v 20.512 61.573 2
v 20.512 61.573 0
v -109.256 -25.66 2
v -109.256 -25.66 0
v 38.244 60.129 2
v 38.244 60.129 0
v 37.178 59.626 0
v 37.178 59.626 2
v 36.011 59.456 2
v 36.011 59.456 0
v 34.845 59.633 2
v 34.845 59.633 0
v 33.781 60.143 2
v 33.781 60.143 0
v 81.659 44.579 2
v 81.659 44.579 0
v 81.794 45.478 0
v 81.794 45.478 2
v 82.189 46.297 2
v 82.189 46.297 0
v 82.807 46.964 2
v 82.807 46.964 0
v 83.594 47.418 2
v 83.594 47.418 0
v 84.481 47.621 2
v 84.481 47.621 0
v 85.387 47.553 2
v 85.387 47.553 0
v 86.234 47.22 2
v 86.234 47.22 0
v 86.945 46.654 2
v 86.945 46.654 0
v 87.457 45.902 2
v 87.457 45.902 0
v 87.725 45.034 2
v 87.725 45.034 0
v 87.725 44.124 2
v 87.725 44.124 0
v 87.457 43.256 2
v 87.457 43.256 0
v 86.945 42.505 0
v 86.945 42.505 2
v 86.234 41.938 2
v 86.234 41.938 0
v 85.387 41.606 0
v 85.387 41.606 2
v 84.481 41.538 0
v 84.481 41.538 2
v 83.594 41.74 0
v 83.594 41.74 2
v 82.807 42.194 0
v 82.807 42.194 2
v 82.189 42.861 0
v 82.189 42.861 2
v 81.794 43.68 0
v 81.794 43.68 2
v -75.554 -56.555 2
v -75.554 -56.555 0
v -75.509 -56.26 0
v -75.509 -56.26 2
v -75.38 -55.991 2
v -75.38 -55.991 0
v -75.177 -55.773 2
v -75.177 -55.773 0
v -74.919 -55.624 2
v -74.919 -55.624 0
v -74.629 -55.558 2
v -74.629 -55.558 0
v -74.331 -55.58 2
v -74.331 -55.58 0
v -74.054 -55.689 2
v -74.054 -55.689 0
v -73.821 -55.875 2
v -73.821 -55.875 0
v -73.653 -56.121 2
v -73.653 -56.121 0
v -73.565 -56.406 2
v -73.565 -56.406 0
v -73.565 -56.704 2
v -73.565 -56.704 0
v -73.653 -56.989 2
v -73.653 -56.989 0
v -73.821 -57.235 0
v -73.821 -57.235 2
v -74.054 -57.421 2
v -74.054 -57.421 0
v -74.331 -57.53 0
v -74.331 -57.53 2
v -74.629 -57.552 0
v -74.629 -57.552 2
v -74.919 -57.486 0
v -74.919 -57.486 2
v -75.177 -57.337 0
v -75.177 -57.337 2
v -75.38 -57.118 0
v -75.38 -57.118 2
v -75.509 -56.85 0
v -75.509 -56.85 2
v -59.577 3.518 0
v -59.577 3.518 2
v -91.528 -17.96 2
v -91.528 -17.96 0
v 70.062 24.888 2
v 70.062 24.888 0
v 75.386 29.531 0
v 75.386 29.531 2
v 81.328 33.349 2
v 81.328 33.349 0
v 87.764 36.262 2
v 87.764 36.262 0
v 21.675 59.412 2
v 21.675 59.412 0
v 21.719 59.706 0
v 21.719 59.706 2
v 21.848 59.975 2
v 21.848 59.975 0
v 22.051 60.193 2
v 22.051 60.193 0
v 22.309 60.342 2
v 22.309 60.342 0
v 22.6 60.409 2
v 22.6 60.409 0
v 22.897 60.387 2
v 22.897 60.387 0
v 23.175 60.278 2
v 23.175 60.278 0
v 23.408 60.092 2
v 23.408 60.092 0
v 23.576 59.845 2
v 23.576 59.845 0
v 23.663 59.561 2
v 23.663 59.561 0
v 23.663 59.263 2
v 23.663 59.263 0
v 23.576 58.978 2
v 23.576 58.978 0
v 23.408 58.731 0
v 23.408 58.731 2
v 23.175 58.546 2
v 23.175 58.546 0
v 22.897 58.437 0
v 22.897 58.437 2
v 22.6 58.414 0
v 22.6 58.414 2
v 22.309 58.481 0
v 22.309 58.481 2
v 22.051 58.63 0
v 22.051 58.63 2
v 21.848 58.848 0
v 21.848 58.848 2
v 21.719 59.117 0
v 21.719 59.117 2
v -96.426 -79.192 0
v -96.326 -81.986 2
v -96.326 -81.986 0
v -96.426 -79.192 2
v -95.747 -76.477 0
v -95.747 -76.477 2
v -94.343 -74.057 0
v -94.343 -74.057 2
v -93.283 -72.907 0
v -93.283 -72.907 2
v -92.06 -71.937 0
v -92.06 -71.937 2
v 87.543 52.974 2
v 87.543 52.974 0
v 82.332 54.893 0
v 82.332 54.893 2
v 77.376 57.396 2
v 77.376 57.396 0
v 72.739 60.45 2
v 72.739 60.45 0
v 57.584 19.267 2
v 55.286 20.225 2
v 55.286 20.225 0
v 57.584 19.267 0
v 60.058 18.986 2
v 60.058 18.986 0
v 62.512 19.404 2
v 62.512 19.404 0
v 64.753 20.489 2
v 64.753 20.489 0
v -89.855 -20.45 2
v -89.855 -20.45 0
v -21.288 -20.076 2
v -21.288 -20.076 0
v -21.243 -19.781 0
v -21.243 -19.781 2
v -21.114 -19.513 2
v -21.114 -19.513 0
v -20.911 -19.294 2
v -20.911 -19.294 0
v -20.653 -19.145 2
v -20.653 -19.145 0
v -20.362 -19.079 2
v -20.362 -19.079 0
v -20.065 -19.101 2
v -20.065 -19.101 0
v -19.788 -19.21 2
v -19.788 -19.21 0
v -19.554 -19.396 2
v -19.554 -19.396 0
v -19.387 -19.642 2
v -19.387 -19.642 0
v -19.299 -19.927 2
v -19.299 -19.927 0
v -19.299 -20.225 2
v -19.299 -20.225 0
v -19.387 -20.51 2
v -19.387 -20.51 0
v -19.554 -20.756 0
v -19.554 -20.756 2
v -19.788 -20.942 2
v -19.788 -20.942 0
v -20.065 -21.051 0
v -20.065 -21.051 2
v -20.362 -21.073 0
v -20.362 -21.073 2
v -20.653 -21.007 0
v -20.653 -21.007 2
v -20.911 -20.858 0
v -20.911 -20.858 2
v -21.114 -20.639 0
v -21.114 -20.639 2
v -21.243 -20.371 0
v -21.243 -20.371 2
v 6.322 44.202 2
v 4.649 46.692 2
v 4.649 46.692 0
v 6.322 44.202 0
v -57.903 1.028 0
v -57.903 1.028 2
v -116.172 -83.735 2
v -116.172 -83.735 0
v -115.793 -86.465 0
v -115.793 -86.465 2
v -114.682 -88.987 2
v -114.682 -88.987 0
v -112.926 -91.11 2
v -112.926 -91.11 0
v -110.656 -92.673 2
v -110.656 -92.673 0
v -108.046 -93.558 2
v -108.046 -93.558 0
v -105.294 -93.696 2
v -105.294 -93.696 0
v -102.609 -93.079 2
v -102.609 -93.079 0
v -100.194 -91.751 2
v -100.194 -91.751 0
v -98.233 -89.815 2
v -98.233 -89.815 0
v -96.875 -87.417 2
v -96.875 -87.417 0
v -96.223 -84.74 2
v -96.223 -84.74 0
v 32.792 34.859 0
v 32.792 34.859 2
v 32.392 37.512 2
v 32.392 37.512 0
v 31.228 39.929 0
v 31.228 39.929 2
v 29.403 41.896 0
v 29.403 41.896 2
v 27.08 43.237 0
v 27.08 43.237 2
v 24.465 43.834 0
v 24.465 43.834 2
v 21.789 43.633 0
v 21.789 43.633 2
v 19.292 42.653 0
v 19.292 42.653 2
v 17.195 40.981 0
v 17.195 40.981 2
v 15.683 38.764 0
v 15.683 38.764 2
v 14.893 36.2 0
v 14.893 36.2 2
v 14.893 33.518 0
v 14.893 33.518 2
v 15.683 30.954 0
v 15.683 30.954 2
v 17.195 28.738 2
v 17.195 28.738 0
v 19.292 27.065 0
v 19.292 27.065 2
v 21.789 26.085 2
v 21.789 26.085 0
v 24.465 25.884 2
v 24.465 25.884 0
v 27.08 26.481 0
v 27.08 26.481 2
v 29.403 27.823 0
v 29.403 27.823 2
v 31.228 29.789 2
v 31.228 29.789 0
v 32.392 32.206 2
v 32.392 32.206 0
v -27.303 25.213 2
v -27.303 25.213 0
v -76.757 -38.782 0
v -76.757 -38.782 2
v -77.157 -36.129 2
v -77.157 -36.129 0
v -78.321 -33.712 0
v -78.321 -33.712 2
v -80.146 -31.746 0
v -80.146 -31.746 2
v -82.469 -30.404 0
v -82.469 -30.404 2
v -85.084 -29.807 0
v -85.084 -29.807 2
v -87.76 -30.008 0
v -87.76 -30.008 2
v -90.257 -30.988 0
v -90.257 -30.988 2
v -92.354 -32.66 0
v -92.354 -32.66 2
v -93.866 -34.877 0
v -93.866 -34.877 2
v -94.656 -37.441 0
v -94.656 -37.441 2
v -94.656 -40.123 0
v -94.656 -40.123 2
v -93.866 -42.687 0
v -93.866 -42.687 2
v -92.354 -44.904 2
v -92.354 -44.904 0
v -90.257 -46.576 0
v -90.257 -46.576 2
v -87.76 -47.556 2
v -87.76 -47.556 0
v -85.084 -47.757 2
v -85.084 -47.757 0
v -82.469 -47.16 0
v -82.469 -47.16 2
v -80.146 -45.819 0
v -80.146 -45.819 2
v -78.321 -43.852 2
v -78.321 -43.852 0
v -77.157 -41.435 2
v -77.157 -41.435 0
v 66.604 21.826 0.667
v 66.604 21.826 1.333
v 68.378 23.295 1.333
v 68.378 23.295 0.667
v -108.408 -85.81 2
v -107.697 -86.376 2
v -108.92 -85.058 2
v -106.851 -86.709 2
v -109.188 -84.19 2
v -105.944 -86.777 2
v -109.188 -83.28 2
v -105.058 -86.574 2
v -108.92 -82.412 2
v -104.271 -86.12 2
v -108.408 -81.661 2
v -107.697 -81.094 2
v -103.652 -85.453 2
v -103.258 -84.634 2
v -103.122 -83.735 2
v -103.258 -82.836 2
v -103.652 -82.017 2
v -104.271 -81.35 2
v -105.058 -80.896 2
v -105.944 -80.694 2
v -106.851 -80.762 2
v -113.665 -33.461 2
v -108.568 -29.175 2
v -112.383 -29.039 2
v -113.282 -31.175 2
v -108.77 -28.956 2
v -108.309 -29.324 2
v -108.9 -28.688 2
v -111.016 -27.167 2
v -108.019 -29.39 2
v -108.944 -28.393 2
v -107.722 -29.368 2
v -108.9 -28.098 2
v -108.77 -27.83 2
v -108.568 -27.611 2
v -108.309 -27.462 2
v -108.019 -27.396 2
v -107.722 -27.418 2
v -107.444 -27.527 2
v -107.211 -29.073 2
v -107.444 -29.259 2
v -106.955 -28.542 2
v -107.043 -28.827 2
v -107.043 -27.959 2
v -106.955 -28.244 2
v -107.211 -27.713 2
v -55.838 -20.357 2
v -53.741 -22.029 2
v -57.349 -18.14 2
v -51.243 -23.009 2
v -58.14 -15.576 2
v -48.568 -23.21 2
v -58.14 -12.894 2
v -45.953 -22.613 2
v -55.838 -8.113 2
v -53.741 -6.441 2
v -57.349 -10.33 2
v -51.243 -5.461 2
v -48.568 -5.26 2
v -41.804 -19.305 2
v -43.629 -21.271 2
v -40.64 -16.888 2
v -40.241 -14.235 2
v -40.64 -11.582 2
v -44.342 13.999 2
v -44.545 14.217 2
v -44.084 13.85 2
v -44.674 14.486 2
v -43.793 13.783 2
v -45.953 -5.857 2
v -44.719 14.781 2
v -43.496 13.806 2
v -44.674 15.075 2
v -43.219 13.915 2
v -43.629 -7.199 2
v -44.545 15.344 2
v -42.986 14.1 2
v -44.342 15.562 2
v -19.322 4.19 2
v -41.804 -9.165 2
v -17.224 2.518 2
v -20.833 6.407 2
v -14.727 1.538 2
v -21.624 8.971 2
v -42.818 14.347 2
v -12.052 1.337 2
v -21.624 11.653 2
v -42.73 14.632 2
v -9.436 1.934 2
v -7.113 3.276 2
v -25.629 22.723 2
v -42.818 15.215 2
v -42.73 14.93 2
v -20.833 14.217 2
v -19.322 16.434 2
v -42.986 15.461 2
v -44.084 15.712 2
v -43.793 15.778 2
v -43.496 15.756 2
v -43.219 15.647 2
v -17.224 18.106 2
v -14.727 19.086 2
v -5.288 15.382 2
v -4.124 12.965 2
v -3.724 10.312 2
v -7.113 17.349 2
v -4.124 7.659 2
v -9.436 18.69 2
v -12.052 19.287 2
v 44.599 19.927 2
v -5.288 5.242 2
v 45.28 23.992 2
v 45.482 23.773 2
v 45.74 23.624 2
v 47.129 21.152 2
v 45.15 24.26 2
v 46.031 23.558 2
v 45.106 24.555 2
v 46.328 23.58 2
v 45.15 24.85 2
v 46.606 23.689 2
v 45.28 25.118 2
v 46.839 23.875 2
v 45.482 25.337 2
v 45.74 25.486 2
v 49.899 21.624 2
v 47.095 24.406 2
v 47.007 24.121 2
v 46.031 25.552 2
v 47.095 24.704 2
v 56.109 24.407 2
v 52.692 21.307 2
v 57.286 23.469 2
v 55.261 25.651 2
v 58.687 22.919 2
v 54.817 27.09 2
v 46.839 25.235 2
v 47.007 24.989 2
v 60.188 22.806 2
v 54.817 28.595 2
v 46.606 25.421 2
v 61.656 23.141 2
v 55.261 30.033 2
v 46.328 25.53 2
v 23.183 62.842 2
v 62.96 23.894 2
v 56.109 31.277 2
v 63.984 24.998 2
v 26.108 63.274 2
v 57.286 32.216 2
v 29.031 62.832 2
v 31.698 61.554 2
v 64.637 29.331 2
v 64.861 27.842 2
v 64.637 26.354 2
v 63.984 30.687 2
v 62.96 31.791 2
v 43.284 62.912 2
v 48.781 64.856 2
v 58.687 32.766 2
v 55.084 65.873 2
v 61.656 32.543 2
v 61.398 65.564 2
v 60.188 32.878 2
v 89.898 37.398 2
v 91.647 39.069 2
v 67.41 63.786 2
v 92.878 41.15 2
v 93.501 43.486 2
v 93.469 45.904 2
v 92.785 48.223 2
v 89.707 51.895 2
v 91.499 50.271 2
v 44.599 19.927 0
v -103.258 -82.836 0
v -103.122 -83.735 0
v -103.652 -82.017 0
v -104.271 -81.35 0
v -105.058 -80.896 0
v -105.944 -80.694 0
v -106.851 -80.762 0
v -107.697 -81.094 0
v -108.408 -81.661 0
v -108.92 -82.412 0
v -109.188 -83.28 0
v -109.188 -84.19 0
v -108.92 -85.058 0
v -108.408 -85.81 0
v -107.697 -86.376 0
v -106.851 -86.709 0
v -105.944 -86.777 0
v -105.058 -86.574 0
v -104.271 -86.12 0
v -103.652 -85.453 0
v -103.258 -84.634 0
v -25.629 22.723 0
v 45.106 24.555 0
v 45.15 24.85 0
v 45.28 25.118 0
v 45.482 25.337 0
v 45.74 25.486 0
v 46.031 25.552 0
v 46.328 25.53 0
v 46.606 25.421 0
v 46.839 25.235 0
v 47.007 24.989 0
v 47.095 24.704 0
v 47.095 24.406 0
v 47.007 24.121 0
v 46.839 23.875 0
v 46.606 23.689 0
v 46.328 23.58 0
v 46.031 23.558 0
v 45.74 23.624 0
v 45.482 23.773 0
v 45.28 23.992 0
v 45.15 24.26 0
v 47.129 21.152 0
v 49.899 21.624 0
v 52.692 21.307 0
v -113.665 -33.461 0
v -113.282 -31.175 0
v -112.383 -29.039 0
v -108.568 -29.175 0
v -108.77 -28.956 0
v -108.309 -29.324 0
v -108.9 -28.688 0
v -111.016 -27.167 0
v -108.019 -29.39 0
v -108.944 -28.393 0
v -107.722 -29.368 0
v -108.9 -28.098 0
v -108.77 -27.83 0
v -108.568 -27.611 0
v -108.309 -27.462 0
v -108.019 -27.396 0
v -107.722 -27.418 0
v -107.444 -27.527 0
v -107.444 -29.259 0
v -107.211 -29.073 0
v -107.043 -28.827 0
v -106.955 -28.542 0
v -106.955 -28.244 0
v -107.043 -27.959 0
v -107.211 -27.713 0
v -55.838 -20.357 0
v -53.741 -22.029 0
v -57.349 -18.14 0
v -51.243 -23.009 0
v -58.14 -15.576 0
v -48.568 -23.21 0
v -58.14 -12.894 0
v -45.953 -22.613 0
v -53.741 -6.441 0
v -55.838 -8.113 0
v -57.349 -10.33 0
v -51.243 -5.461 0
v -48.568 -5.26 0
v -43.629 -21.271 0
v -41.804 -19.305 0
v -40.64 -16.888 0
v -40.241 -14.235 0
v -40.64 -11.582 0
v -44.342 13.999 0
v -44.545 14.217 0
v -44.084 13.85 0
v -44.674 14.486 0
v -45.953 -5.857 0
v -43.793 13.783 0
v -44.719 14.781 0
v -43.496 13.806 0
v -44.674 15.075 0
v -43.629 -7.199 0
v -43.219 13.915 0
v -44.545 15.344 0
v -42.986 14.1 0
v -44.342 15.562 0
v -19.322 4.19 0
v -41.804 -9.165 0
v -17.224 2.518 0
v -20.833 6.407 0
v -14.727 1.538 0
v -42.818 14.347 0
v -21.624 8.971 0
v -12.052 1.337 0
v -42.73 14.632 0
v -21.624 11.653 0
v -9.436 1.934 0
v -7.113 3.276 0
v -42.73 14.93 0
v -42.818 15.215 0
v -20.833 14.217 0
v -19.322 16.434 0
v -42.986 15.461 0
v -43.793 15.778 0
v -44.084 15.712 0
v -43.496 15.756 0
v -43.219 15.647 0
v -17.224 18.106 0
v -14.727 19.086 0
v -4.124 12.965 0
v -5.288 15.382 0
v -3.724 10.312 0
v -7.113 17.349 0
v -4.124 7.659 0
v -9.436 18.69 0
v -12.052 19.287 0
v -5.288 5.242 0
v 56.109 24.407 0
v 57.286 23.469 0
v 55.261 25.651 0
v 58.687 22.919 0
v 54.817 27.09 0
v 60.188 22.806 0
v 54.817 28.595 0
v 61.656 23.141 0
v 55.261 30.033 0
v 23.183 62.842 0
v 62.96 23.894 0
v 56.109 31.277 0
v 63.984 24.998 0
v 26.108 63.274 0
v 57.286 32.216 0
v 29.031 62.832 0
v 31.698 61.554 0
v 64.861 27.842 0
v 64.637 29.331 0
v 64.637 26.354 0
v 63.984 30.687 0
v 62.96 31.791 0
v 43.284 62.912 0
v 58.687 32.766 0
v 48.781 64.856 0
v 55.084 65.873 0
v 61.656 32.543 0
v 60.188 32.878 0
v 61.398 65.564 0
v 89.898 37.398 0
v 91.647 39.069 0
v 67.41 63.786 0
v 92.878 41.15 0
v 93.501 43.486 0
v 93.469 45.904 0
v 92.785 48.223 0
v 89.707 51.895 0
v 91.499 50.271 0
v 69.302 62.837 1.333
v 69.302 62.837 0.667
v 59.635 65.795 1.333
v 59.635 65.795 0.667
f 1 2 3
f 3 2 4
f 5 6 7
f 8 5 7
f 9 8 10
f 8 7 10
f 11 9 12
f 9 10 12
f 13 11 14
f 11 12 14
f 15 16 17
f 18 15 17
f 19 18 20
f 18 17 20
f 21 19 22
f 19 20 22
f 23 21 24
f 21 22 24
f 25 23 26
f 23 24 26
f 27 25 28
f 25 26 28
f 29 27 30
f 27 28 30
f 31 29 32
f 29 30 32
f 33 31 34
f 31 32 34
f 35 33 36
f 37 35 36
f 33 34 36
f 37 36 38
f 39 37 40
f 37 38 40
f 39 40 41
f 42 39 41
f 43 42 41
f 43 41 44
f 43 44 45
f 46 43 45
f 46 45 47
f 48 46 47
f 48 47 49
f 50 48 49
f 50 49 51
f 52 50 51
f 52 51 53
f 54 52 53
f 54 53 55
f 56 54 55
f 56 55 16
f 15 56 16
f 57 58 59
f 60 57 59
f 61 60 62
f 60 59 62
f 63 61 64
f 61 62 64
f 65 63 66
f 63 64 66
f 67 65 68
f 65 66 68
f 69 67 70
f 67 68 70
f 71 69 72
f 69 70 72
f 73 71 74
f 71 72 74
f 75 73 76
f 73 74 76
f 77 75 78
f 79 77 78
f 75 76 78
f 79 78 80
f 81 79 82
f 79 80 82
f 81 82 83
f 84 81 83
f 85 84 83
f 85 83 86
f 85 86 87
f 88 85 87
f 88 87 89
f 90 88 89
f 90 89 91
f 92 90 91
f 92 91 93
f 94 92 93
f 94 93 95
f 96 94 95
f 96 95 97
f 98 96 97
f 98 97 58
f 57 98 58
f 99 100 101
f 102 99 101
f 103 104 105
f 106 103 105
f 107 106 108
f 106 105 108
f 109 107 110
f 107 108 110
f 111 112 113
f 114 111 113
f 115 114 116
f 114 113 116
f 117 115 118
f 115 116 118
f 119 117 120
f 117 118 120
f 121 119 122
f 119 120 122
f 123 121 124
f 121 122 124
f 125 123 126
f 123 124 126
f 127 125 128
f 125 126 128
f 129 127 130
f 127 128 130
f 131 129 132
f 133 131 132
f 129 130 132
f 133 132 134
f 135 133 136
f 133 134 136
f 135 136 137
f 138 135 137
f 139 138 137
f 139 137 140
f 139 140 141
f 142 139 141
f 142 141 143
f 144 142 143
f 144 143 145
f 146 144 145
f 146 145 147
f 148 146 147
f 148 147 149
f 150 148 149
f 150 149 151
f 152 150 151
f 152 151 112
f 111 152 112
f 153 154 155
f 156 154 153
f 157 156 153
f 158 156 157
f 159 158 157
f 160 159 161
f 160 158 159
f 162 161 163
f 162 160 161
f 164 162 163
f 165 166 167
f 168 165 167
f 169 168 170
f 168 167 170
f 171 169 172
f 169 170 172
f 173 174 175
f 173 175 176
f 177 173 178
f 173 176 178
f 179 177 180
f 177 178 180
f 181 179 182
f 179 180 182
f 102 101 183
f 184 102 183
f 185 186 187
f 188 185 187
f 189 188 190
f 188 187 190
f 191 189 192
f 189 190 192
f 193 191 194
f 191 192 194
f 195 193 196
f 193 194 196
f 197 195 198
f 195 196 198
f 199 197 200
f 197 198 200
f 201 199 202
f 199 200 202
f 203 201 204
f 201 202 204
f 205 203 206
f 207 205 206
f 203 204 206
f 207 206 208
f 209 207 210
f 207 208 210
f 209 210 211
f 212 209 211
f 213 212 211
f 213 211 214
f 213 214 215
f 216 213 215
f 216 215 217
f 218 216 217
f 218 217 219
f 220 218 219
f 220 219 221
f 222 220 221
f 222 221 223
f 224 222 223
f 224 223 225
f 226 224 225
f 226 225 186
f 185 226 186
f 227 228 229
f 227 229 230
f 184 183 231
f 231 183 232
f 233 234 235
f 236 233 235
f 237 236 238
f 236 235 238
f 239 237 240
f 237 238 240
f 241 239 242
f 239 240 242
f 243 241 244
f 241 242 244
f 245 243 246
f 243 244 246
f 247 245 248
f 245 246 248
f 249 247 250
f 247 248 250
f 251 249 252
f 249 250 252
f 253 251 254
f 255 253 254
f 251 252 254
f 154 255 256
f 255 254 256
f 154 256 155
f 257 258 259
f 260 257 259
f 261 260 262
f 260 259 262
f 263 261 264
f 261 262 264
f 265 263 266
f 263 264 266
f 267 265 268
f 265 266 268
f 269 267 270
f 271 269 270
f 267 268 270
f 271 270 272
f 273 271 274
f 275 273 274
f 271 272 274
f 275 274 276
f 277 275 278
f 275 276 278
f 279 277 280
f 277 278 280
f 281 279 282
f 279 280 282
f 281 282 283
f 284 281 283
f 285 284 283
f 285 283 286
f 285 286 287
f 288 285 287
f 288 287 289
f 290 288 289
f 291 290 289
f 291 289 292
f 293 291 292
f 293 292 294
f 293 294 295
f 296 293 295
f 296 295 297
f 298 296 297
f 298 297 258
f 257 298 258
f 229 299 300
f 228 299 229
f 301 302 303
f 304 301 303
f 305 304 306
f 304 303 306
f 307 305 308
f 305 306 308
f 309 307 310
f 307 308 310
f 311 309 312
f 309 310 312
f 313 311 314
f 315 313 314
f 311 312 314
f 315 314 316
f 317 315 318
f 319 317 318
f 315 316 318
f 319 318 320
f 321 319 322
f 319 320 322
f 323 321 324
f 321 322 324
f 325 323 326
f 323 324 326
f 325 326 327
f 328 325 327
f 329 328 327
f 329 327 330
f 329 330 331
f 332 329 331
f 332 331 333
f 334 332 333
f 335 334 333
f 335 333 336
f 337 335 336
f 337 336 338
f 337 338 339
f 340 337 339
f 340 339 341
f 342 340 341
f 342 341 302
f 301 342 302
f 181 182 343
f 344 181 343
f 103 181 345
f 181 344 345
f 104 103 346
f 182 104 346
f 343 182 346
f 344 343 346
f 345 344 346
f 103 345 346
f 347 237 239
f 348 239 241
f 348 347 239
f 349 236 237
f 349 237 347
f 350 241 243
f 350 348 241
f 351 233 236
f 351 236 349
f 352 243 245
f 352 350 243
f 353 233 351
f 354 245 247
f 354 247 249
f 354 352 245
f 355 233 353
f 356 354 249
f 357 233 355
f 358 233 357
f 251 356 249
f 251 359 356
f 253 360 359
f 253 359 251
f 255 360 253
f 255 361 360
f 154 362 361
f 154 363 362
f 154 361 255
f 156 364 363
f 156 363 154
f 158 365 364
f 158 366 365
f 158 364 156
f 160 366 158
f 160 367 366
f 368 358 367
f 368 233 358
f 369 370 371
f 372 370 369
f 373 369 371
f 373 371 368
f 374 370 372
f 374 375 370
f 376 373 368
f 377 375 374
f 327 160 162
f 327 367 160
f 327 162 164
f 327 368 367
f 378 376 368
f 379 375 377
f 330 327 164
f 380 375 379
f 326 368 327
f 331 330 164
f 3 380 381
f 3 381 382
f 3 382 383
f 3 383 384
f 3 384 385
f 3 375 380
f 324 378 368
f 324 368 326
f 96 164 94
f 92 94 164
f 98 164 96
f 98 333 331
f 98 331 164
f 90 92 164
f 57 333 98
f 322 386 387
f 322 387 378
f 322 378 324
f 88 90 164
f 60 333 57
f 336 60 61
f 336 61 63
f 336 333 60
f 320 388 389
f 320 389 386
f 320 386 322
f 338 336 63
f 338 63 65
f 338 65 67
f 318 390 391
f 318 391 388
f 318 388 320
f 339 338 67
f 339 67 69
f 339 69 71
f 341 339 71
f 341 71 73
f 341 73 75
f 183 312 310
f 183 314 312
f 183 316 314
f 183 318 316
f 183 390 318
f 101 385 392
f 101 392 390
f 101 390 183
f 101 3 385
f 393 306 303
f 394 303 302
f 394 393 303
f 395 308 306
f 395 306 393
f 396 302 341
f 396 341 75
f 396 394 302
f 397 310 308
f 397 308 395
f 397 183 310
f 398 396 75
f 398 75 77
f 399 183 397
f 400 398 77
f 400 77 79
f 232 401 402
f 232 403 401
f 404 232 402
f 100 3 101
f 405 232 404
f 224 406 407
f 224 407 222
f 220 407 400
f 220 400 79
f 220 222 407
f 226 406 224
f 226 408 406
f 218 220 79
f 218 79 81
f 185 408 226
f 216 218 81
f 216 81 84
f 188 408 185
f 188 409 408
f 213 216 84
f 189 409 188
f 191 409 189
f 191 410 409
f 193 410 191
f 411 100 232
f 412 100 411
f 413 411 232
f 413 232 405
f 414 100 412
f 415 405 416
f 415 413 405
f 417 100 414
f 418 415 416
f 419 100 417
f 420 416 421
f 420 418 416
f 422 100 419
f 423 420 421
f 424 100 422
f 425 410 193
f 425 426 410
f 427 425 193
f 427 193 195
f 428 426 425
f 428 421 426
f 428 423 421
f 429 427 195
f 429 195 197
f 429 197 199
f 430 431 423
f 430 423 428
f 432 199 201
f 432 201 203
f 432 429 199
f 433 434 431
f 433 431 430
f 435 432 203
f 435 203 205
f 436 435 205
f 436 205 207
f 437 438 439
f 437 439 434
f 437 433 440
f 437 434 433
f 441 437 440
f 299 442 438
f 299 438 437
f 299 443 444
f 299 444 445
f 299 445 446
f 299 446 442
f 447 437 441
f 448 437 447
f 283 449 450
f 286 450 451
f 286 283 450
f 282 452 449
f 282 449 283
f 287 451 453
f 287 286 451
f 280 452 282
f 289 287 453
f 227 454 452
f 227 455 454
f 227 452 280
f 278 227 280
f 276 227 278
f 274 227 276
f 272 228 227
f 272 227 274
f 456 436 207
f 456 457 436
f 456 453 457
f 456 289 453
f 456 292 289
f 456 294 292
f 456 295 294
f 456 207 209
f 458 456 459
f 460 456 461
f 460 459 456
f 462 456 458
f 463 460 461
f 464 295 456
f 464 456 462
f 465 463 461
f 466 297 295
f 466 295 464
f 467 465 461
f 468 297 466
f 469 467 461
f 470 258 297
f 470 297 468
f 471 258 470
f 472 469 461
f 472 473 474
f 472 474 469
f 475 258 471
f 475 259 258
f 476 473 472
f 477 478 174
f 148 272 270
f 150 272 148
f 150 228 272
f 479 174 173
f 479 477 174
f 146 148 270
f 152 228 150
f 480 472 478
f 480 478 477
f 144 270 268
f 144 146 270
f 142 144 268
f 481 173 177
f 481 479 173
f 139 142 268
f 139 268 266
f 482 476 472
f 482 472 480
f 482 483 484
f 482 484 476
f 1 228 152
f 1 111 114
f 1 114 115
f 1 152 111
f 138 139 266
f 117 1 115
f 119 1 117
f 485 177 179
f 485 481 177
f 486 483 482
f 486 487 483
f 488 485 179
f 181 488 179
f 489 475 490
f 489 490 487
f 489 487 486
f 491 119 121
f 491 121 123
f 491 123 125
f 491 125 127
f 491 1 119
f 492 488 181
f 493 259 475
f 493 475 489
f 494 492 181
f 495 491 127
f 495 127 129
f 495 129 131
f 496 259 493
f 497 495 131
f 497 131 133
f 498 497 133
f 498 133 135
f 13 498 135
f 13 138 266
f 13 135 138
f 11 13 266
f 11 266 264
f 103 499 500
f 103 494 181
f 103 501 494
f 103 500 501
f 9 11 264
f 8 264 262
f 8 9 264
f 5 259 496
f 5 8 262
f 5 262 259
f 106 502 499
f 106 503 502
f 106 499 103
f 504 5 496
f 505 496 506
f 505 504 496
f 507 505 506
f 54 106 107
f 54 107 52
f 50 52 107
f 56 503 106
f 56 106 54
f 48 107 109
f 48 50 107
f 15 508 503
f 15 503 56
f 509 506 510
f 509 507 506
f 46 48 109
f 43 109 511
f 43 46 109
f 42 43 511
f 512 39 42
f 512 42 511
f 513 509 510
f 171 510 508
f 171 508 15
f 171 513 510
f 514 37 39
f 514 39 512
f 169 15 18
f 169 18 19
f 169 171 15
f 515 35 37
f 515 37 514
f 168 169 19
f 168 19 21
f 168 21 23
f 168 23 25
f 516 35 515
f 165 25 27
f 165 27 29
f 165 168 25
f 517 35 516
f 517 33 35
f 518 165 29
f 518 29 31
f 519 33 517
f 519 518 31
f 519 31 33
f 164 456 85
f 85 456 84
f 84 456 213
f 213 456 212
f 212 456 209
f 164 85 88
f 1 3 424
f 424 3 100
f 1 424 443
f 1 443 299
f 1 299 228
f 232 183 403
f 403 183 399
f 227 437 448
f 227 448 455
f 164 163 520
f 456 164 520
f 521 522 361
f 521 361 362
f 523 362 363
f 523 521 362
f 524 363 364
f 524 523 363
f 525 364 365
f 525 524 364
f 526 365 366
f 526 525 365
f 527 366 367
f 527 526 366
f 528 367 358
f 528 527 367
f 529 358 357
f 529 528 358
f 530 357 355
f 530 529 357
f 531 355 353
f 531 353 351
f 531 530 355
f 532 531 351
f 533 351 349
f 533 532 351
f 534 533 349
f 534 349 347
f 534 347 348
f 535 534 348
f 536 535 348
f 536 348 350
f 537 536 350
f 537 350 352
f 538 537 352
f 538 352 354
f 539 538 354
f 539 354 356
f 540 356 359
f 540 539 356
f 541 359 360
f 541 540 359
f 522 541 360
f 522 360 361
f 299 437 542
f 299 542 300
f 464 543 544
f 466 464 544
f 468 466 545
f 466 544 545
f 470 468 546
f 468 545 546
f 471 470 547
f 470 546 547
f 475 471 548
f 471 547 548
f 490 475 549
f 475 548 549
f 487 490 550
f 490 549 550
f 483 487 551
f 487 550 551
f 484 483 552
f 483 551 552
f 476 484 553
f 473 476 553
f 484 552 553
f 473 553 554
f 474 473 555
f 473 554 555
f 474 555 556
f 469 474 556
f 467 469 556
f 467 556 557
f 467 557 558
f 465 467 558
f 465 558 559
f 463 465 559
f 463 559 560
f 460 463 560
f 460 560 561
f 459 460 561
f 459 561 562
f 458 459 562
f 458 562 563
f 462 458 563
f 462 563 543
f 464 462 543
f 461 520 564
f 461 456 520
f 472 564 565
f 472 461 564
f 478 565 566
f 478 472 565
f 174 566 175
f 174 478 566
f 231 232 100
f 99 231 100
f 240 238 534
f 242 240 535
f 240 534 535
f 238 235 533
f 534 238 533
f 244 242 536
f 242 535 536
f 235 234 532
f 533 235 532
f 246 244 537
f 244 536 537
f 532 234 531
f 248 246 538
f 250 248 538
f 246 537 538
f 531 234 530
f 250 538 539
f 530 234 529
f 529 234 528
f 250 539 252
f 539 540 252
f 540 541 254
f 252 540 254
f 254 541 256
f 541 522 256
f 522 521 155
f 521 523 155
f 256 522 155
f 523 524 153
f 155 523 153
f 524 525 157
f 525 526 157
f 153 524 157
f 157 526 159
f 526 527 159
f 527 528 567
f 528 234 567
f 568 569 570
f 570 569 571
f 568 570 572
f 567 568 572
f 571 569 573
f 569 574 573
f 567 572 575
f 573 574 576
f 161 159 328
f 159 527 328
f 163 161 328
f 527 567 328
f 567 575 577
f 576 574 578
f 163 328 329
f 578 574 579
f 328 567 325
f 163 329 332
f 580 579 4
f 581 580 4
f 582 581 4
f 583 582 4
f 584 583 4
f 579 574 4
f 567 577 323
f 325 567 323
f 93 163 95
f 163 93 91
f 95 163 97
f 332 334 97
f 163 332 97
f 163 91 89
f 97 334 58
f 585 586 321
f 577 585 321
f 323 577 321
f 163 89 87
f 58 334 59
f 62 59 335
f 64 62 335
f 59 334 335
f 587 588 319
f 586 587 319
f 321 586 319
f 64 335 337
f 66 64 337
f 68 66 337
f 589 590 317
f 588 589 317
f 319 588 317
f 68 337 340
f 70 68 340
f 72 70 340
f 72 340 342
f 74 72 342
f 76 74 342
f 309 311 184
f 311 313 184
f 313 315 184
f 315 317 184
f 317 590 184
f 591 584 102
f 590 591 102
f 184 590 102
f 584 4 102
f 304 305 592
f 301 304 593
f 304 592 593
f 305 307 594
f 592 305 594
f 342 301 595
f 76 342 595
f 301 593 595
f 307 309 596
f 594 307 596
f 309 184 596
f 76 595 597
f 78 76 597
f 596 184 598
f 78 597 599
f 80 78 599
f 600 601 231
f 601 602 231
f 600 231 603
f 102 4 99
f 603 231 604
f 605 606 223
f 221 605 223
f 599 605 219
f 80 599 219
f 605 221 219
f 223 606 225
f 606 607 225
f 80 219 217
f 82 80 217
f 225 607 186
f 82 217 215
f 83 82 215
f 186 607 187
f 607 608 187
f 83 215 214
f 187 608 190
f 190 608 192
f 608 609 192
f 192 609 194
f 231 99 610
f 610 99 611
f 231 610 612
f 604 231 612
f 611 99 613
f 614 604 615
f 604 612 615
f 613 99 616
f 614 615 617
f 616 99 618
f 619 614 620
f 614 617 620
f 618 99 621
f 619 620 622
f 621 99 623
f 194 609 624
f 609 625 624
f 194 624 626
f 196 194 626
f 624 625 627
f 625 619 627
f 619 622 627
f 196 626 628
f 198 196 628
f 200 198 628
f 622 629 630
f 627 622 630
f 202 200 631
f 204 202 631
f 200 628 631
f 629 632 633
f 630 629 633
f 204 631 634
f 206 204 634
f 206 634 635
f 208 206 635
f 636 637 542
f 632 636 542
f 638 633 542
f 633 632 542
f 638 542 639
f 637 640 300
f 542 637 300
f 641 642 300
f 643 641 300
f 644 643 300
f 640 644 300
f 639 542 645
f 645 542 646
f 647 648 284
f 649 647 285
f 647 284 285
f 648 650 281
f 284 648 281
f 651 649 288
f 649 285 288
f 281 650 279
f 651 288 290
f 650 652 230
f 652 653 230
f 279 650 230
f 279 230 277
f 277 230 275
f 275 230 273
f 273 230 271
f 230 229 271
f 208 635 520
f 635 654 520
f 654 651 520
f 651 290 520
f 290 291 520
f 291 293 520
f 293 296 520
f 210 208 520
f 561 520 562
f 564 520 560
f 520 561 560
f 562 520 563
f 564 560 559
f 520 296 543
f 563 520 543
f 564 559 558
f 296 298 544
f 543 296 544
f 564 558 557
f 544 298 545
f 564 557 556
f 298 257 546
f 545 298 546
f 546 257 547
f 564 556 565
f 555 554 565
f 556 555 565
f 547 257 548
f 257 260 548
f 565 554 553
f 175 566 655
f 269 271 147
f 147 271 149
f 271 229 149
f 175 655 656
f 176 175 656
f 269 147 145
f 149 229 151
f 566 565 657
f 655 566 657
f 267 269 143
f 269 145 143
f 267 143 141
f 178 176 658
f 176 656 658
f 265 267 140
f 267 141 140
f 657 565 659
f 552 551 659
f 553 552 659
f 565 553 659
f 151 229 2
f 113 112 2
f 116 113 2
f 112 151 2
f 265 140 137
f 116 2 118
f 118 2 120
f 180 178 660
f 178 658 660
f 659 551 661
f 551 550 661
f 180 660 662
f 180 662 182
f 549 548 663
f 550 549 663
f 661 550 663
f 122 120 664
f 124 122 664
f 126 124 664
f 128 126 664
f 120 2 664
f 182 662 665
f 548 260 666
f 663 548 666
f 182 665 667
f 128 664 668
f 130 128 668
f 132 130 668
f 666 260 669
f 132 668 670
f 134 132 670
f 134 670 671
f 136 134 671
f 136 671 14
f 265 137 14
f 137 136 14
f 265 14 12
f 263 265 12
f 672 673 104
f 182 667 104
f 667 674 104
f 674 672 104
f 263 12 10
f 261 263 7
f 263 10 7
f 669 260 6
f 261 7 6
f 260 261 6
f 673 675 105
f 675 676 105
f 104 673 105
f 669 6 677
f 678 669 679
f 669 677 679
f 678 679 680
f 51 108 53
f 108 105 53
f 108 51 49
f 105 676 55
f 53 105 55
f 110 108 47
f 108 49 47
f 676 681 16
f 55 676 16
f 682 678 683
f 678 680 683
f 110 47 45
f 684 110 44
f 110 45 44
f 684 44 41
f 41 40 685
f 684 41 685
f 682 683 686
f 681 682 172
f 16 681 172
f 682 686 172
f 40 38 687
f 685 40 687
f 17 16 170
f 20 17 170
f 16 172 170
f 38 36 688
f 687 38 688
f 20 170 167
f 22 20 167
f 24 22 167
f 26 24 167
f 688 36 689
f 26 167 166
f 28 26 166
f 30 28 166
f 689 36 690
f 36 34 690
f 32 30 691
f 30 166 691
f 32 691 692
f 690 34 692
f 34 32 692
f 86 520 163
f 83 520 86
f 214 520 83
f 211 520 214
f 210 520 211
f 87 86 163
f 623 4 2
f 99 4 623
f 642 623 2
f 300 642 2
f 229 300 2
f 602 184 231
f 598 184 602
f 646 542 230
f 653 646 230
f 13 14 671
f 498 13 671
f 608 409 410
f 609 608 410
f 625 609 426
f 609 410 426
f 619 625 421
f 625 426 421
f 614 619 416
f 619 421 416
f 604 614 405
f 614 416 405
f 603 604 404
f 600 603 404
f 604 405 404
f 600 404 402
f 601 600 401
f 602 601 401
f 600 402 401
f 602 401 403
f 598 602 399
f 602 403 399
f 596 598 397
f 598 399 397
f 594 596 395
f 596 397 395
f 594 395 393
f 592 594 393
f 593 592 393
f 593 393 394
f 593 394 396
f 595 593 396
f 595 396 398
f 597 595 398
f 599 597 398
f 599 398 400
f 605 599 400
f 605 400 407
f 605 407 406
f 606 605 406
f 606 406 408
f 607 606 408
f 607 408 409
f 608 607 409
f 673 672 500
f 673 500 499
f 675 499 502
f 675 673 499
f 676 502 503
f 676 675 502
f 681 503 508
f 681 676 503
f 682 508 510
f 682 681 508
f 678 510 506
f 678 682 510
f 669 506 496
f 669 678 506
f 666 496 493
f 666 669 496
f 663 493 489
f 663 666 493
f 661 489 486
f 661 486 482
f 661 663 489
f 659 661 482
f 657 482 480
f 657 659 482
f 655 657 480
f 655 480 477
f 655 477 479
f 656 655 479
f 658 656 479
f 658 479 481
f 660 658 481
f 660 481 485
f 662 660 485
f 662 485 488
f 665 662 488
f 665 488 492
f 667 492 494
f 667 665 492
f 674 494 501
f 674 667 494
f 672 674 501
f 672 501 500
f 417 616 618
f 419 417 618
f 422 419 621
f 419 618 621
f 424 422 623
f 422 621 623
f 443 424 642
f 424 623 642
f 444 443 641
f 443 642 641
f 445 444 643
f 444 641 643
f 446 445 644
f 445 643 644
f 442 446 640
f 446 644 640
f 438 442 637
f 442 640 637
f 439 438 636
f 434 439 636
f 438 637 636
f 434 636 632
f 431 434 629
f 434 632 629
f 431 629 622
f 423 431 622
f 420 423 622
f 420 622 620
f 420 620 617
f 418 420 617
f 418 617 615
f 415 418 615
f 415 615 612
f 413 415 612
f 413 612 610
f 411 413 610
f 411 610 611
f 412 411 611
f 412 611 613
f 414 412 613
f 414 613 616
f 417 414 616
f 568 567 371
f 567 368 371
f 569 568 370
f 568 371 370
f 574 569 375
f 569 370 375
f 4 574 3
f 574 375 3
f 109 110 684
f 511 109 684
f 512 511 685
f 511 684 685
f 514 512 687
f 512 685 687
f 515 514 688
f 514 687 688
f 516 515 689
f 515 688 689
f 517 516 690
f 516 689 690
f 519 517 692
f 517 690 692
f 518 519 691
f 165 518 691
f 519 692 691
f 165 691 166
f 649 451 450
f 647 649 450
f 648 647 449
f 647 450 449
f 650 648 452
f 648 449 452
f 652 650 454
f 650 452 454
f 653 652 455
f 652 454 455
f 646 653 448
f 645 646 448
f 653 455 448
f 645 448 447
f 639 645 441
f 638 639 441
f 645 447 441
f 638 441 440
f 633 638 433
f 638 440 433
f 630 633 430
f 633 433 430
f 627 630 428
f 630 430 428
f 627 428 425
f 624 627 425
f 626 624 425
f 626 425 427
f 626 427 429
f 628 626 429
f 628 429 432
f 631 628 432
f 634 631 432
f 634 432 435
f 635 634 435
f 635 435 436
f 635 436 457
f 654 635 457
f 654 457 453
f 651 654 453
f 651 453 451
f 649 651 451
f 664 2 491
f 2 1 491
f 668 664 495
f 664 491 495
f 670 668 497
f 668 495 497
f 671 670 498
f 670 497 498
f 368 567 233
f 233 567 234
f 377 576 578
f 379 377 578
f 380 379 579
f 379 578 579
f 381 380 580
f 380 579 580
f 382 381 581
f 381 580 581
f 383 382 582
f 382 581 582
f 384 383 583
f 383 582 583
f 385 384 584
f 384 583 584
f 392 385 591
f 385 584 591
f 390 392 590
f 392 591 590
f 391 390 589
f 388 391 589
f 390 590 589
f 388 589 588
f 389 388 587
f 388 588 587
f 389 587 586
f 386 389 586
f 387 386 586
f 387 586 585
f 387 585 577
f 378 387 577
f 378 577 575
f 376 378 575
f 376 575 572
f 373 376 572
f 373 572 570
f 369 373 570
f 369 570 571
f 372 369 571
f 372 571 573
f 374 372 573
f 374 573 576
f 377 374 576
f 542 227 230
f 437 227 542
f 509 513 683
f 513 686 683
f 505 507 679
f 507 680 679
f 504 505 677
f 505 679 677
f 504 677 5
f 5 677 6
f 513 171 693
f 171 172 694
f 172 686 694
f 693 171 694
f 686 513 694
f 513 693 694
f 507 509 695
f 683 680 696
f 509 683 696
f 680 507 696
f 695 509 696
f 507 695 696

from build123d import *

# Parameters (mm, degrees)
SKETCH_1_R          = 3.05
SKETCH_1_R_2        = 5.05
EXTRUDE_1_DEPTH     = 2
SKETCH_2_R          = 3.05
CUT_EXTRUDE_1_DEPTH = 3.0000001
FILLET_1_R          = 10
FILLET_2_R          = 10
SKETCH_4_R          = 9
CUT_EXTRUDE_3_DEPTH = 10
FILLET_3_R          = 10
SKETCH_5_R          = 1
CUT_EXTRUDE_4_DEPTH = 10
CUT_EXTRUDE_5_DEPTH = 10


with BuildPart() as part:
    # 草图1 → 凸台-拉伸1 (new body)
    with BuildSketch(Plane.XY):
        with BuildLine():
            Line((33.781378488, 60.143481549), (26.111364219, 65.33671315))
            Line((26.111364219, 65.33671315), (-113.414892299, -28.455707895))
            Line((-113.414892299, -28.455707895), (-116.172277489, -83.735077284))
            ThreePointArc((-116.172277489, -83.735077284), (-103.256088302, -93.300423103), (-97.873109363, -78.156205675))
            Line((-97.873109363, -78.156205675), (-98.943047596, -76.564558134))
            Line((-98.943047596, -76.564558134), (51.562392304, 24.608295928))
            ThreePointArc((51.562392304, 24.608295928), (57.170026982, 19.385116489), (64.753479859, 20.488933768))
            add(Edge.make_bspline(
                [(64.753479859, 20.488933768), (66.638530957, 21.755918107), (68.426748806, 23.236531132), (70.062196414, 24.887697208)],
                knots=[0.026108887, 0.026108887, 0.026108887, 0.026108887, 0.973640222, 0.973640222, 0.973640222, 0.973640222], degree=3))
            ThreePointArc((70.062196414, 24.887697208), (78.287330396, 31.54858645), (87.76365302, 36.262351829))
            ThreePointArc((87.76365302, 36.262351829), (93.567944773, 44.696209097), (87.54263496, 52.973611636))
            ThreePointArc((87.54263496, 52.973611636), (79.818181838, 56.073118878), (72.738975332, 60.450213395))
            add(Edge.make_bspline(
                [(72.738975332, 60.450213395), (71.67095149, 61.35223039), (67.696722379, 64.109293298), (55.783849218, 67.566421953), (44.38146919, 64.224123675), (38.244385983, 60.128526636)],
                knots=[0.009949241, 0.009949241, 0.009949241, 0.009949241, 0.121591481, 0.393982167, 0.99006759, 0.99006759, 0.99006759, 0.99006759], degree=3))
            ThreePointArc((38.244385983, 60.128526636), (36.010602622, 59.45569692), (33.781378488, 60.143481549))
        make_face()
        with Locations((-106.172277489, -83.735077284)):
            Circle(SKETCH_1_R, mode=Mode.SUBTRACT)
        with Locations((59.811085021, 27.842354887)):
            Circle(SKETCH_1_R_2, mode=Mode.SUBTRACT)
    extrude(amount=EXTRUDE_1_DEPTH)

    # 草图2 → 切除-拉伸1 (cut, through all)
    with BuildSketch(Plane(origin=(0, 0, 0), x_dir=(-1, 0, 0), z_dir=(0, 0, -1))):
        with Locations((-84.708692938, 44.579039315)):
            Circle(SKETCH_2_R)
    extrude(amount=-CUT_EXTRUDE_1_DEPTH, mode=Mode.SUBTRACT)

    # 圆角1
    fillet_1_edges = [part.edges().sort_by_distance(p)[0] for p in [
        (51.562392304, 24.608295928, 1),
    ]]
    fillet(fillet_1_edges, radius=FILLET_1_R)

    # 圆角2
    fillet_2_edges = [part.edges().sort_by_distance(p)[0] for p in [
        (-113.414892299, -28.455707895, 1),
        (26.111364219, 65.33671315, 1),
    ]]
    fillet(fillet_2_edges, radius=FILLET_2_R)

    # 草图4 → 切除-拉伸3 (cut)
    with BuildSketch(Plane.XY.offset(2)):
        with Locations((-49.240629704, -14.235008927)):
            Circle(SKETCH_4_R)
        with Locations((-12.724289952, 10.312026151)):
            Circle(SKETCH_4_R)
        with Locations((23.792049801, 34.859061229)):
            Circle(SKETCH_4_R)
        with Locations((-85.756969456, -38.782044004)):
            Circle(SKETCH_4_R)
    extrude(amount=-CUT_EXTRUDE_3_DEPTH, mode=Mode.SUBTRACT)

    # 圆角3
    fillet_3_edges = [part.edges().sort_by_distance(p)[0] for p in [
        (-98.943047596, -76.564558134, 1),
    ]]
    fillet(fillet_3_edges, radius=FILLET_3_R)

    # 草图5 → 切除-拉伸4 (cut)
    with BuildSketch(Plane(origin=(0, 0, 0), x_dir=(-1, 0, 0), z_dir=(0, 0, -1))):
        with Locations((-22.674576674, 59.411613704)):
            Circle(SKETCH_5_R)
        with Locations((43.71876833, 14.780640835)):
            Circle(SKETCH_5_R)
        with Locations((107.944085943, -28.392939404)):
            Circle(SKETCH_5_R)
        with Locations((-46.10583743, 24.555107577)):
            Circle(SKETCH_5_R)
        with Locations((20.287507574, -20.075865292)):
            Circle(SKETCH_5_R)
        with Locations((74.553823436, -56.554799601)):
            Circle(SKETCH_5_R)
    extrude(amount=-CUT_EXTRUDE_4_DEPTH, mode=Mode.SUBTRACT)

    # 草图6 → 切除-拉伸5 (cut)
    with BuildSketch(Plane.XY.offset(2)):
        Polygon((4.648732698, 46.691800395), (6.322394181, 44.202049957), (-25.629403102, 22.723394264), (-27.303064585, 25.213144702), align=None)
        Polygon((-89.854720715, -20.450185975), (-57.902923432, 1.028469718), (-59.576584915, 3.518220156), (-91.528382198, -17.960435537), align=None)
    extrude(amount=-CUT_EXTRUDE_5_DEPTH, mode=Mode.SUBTRACT)


solid = part.part
